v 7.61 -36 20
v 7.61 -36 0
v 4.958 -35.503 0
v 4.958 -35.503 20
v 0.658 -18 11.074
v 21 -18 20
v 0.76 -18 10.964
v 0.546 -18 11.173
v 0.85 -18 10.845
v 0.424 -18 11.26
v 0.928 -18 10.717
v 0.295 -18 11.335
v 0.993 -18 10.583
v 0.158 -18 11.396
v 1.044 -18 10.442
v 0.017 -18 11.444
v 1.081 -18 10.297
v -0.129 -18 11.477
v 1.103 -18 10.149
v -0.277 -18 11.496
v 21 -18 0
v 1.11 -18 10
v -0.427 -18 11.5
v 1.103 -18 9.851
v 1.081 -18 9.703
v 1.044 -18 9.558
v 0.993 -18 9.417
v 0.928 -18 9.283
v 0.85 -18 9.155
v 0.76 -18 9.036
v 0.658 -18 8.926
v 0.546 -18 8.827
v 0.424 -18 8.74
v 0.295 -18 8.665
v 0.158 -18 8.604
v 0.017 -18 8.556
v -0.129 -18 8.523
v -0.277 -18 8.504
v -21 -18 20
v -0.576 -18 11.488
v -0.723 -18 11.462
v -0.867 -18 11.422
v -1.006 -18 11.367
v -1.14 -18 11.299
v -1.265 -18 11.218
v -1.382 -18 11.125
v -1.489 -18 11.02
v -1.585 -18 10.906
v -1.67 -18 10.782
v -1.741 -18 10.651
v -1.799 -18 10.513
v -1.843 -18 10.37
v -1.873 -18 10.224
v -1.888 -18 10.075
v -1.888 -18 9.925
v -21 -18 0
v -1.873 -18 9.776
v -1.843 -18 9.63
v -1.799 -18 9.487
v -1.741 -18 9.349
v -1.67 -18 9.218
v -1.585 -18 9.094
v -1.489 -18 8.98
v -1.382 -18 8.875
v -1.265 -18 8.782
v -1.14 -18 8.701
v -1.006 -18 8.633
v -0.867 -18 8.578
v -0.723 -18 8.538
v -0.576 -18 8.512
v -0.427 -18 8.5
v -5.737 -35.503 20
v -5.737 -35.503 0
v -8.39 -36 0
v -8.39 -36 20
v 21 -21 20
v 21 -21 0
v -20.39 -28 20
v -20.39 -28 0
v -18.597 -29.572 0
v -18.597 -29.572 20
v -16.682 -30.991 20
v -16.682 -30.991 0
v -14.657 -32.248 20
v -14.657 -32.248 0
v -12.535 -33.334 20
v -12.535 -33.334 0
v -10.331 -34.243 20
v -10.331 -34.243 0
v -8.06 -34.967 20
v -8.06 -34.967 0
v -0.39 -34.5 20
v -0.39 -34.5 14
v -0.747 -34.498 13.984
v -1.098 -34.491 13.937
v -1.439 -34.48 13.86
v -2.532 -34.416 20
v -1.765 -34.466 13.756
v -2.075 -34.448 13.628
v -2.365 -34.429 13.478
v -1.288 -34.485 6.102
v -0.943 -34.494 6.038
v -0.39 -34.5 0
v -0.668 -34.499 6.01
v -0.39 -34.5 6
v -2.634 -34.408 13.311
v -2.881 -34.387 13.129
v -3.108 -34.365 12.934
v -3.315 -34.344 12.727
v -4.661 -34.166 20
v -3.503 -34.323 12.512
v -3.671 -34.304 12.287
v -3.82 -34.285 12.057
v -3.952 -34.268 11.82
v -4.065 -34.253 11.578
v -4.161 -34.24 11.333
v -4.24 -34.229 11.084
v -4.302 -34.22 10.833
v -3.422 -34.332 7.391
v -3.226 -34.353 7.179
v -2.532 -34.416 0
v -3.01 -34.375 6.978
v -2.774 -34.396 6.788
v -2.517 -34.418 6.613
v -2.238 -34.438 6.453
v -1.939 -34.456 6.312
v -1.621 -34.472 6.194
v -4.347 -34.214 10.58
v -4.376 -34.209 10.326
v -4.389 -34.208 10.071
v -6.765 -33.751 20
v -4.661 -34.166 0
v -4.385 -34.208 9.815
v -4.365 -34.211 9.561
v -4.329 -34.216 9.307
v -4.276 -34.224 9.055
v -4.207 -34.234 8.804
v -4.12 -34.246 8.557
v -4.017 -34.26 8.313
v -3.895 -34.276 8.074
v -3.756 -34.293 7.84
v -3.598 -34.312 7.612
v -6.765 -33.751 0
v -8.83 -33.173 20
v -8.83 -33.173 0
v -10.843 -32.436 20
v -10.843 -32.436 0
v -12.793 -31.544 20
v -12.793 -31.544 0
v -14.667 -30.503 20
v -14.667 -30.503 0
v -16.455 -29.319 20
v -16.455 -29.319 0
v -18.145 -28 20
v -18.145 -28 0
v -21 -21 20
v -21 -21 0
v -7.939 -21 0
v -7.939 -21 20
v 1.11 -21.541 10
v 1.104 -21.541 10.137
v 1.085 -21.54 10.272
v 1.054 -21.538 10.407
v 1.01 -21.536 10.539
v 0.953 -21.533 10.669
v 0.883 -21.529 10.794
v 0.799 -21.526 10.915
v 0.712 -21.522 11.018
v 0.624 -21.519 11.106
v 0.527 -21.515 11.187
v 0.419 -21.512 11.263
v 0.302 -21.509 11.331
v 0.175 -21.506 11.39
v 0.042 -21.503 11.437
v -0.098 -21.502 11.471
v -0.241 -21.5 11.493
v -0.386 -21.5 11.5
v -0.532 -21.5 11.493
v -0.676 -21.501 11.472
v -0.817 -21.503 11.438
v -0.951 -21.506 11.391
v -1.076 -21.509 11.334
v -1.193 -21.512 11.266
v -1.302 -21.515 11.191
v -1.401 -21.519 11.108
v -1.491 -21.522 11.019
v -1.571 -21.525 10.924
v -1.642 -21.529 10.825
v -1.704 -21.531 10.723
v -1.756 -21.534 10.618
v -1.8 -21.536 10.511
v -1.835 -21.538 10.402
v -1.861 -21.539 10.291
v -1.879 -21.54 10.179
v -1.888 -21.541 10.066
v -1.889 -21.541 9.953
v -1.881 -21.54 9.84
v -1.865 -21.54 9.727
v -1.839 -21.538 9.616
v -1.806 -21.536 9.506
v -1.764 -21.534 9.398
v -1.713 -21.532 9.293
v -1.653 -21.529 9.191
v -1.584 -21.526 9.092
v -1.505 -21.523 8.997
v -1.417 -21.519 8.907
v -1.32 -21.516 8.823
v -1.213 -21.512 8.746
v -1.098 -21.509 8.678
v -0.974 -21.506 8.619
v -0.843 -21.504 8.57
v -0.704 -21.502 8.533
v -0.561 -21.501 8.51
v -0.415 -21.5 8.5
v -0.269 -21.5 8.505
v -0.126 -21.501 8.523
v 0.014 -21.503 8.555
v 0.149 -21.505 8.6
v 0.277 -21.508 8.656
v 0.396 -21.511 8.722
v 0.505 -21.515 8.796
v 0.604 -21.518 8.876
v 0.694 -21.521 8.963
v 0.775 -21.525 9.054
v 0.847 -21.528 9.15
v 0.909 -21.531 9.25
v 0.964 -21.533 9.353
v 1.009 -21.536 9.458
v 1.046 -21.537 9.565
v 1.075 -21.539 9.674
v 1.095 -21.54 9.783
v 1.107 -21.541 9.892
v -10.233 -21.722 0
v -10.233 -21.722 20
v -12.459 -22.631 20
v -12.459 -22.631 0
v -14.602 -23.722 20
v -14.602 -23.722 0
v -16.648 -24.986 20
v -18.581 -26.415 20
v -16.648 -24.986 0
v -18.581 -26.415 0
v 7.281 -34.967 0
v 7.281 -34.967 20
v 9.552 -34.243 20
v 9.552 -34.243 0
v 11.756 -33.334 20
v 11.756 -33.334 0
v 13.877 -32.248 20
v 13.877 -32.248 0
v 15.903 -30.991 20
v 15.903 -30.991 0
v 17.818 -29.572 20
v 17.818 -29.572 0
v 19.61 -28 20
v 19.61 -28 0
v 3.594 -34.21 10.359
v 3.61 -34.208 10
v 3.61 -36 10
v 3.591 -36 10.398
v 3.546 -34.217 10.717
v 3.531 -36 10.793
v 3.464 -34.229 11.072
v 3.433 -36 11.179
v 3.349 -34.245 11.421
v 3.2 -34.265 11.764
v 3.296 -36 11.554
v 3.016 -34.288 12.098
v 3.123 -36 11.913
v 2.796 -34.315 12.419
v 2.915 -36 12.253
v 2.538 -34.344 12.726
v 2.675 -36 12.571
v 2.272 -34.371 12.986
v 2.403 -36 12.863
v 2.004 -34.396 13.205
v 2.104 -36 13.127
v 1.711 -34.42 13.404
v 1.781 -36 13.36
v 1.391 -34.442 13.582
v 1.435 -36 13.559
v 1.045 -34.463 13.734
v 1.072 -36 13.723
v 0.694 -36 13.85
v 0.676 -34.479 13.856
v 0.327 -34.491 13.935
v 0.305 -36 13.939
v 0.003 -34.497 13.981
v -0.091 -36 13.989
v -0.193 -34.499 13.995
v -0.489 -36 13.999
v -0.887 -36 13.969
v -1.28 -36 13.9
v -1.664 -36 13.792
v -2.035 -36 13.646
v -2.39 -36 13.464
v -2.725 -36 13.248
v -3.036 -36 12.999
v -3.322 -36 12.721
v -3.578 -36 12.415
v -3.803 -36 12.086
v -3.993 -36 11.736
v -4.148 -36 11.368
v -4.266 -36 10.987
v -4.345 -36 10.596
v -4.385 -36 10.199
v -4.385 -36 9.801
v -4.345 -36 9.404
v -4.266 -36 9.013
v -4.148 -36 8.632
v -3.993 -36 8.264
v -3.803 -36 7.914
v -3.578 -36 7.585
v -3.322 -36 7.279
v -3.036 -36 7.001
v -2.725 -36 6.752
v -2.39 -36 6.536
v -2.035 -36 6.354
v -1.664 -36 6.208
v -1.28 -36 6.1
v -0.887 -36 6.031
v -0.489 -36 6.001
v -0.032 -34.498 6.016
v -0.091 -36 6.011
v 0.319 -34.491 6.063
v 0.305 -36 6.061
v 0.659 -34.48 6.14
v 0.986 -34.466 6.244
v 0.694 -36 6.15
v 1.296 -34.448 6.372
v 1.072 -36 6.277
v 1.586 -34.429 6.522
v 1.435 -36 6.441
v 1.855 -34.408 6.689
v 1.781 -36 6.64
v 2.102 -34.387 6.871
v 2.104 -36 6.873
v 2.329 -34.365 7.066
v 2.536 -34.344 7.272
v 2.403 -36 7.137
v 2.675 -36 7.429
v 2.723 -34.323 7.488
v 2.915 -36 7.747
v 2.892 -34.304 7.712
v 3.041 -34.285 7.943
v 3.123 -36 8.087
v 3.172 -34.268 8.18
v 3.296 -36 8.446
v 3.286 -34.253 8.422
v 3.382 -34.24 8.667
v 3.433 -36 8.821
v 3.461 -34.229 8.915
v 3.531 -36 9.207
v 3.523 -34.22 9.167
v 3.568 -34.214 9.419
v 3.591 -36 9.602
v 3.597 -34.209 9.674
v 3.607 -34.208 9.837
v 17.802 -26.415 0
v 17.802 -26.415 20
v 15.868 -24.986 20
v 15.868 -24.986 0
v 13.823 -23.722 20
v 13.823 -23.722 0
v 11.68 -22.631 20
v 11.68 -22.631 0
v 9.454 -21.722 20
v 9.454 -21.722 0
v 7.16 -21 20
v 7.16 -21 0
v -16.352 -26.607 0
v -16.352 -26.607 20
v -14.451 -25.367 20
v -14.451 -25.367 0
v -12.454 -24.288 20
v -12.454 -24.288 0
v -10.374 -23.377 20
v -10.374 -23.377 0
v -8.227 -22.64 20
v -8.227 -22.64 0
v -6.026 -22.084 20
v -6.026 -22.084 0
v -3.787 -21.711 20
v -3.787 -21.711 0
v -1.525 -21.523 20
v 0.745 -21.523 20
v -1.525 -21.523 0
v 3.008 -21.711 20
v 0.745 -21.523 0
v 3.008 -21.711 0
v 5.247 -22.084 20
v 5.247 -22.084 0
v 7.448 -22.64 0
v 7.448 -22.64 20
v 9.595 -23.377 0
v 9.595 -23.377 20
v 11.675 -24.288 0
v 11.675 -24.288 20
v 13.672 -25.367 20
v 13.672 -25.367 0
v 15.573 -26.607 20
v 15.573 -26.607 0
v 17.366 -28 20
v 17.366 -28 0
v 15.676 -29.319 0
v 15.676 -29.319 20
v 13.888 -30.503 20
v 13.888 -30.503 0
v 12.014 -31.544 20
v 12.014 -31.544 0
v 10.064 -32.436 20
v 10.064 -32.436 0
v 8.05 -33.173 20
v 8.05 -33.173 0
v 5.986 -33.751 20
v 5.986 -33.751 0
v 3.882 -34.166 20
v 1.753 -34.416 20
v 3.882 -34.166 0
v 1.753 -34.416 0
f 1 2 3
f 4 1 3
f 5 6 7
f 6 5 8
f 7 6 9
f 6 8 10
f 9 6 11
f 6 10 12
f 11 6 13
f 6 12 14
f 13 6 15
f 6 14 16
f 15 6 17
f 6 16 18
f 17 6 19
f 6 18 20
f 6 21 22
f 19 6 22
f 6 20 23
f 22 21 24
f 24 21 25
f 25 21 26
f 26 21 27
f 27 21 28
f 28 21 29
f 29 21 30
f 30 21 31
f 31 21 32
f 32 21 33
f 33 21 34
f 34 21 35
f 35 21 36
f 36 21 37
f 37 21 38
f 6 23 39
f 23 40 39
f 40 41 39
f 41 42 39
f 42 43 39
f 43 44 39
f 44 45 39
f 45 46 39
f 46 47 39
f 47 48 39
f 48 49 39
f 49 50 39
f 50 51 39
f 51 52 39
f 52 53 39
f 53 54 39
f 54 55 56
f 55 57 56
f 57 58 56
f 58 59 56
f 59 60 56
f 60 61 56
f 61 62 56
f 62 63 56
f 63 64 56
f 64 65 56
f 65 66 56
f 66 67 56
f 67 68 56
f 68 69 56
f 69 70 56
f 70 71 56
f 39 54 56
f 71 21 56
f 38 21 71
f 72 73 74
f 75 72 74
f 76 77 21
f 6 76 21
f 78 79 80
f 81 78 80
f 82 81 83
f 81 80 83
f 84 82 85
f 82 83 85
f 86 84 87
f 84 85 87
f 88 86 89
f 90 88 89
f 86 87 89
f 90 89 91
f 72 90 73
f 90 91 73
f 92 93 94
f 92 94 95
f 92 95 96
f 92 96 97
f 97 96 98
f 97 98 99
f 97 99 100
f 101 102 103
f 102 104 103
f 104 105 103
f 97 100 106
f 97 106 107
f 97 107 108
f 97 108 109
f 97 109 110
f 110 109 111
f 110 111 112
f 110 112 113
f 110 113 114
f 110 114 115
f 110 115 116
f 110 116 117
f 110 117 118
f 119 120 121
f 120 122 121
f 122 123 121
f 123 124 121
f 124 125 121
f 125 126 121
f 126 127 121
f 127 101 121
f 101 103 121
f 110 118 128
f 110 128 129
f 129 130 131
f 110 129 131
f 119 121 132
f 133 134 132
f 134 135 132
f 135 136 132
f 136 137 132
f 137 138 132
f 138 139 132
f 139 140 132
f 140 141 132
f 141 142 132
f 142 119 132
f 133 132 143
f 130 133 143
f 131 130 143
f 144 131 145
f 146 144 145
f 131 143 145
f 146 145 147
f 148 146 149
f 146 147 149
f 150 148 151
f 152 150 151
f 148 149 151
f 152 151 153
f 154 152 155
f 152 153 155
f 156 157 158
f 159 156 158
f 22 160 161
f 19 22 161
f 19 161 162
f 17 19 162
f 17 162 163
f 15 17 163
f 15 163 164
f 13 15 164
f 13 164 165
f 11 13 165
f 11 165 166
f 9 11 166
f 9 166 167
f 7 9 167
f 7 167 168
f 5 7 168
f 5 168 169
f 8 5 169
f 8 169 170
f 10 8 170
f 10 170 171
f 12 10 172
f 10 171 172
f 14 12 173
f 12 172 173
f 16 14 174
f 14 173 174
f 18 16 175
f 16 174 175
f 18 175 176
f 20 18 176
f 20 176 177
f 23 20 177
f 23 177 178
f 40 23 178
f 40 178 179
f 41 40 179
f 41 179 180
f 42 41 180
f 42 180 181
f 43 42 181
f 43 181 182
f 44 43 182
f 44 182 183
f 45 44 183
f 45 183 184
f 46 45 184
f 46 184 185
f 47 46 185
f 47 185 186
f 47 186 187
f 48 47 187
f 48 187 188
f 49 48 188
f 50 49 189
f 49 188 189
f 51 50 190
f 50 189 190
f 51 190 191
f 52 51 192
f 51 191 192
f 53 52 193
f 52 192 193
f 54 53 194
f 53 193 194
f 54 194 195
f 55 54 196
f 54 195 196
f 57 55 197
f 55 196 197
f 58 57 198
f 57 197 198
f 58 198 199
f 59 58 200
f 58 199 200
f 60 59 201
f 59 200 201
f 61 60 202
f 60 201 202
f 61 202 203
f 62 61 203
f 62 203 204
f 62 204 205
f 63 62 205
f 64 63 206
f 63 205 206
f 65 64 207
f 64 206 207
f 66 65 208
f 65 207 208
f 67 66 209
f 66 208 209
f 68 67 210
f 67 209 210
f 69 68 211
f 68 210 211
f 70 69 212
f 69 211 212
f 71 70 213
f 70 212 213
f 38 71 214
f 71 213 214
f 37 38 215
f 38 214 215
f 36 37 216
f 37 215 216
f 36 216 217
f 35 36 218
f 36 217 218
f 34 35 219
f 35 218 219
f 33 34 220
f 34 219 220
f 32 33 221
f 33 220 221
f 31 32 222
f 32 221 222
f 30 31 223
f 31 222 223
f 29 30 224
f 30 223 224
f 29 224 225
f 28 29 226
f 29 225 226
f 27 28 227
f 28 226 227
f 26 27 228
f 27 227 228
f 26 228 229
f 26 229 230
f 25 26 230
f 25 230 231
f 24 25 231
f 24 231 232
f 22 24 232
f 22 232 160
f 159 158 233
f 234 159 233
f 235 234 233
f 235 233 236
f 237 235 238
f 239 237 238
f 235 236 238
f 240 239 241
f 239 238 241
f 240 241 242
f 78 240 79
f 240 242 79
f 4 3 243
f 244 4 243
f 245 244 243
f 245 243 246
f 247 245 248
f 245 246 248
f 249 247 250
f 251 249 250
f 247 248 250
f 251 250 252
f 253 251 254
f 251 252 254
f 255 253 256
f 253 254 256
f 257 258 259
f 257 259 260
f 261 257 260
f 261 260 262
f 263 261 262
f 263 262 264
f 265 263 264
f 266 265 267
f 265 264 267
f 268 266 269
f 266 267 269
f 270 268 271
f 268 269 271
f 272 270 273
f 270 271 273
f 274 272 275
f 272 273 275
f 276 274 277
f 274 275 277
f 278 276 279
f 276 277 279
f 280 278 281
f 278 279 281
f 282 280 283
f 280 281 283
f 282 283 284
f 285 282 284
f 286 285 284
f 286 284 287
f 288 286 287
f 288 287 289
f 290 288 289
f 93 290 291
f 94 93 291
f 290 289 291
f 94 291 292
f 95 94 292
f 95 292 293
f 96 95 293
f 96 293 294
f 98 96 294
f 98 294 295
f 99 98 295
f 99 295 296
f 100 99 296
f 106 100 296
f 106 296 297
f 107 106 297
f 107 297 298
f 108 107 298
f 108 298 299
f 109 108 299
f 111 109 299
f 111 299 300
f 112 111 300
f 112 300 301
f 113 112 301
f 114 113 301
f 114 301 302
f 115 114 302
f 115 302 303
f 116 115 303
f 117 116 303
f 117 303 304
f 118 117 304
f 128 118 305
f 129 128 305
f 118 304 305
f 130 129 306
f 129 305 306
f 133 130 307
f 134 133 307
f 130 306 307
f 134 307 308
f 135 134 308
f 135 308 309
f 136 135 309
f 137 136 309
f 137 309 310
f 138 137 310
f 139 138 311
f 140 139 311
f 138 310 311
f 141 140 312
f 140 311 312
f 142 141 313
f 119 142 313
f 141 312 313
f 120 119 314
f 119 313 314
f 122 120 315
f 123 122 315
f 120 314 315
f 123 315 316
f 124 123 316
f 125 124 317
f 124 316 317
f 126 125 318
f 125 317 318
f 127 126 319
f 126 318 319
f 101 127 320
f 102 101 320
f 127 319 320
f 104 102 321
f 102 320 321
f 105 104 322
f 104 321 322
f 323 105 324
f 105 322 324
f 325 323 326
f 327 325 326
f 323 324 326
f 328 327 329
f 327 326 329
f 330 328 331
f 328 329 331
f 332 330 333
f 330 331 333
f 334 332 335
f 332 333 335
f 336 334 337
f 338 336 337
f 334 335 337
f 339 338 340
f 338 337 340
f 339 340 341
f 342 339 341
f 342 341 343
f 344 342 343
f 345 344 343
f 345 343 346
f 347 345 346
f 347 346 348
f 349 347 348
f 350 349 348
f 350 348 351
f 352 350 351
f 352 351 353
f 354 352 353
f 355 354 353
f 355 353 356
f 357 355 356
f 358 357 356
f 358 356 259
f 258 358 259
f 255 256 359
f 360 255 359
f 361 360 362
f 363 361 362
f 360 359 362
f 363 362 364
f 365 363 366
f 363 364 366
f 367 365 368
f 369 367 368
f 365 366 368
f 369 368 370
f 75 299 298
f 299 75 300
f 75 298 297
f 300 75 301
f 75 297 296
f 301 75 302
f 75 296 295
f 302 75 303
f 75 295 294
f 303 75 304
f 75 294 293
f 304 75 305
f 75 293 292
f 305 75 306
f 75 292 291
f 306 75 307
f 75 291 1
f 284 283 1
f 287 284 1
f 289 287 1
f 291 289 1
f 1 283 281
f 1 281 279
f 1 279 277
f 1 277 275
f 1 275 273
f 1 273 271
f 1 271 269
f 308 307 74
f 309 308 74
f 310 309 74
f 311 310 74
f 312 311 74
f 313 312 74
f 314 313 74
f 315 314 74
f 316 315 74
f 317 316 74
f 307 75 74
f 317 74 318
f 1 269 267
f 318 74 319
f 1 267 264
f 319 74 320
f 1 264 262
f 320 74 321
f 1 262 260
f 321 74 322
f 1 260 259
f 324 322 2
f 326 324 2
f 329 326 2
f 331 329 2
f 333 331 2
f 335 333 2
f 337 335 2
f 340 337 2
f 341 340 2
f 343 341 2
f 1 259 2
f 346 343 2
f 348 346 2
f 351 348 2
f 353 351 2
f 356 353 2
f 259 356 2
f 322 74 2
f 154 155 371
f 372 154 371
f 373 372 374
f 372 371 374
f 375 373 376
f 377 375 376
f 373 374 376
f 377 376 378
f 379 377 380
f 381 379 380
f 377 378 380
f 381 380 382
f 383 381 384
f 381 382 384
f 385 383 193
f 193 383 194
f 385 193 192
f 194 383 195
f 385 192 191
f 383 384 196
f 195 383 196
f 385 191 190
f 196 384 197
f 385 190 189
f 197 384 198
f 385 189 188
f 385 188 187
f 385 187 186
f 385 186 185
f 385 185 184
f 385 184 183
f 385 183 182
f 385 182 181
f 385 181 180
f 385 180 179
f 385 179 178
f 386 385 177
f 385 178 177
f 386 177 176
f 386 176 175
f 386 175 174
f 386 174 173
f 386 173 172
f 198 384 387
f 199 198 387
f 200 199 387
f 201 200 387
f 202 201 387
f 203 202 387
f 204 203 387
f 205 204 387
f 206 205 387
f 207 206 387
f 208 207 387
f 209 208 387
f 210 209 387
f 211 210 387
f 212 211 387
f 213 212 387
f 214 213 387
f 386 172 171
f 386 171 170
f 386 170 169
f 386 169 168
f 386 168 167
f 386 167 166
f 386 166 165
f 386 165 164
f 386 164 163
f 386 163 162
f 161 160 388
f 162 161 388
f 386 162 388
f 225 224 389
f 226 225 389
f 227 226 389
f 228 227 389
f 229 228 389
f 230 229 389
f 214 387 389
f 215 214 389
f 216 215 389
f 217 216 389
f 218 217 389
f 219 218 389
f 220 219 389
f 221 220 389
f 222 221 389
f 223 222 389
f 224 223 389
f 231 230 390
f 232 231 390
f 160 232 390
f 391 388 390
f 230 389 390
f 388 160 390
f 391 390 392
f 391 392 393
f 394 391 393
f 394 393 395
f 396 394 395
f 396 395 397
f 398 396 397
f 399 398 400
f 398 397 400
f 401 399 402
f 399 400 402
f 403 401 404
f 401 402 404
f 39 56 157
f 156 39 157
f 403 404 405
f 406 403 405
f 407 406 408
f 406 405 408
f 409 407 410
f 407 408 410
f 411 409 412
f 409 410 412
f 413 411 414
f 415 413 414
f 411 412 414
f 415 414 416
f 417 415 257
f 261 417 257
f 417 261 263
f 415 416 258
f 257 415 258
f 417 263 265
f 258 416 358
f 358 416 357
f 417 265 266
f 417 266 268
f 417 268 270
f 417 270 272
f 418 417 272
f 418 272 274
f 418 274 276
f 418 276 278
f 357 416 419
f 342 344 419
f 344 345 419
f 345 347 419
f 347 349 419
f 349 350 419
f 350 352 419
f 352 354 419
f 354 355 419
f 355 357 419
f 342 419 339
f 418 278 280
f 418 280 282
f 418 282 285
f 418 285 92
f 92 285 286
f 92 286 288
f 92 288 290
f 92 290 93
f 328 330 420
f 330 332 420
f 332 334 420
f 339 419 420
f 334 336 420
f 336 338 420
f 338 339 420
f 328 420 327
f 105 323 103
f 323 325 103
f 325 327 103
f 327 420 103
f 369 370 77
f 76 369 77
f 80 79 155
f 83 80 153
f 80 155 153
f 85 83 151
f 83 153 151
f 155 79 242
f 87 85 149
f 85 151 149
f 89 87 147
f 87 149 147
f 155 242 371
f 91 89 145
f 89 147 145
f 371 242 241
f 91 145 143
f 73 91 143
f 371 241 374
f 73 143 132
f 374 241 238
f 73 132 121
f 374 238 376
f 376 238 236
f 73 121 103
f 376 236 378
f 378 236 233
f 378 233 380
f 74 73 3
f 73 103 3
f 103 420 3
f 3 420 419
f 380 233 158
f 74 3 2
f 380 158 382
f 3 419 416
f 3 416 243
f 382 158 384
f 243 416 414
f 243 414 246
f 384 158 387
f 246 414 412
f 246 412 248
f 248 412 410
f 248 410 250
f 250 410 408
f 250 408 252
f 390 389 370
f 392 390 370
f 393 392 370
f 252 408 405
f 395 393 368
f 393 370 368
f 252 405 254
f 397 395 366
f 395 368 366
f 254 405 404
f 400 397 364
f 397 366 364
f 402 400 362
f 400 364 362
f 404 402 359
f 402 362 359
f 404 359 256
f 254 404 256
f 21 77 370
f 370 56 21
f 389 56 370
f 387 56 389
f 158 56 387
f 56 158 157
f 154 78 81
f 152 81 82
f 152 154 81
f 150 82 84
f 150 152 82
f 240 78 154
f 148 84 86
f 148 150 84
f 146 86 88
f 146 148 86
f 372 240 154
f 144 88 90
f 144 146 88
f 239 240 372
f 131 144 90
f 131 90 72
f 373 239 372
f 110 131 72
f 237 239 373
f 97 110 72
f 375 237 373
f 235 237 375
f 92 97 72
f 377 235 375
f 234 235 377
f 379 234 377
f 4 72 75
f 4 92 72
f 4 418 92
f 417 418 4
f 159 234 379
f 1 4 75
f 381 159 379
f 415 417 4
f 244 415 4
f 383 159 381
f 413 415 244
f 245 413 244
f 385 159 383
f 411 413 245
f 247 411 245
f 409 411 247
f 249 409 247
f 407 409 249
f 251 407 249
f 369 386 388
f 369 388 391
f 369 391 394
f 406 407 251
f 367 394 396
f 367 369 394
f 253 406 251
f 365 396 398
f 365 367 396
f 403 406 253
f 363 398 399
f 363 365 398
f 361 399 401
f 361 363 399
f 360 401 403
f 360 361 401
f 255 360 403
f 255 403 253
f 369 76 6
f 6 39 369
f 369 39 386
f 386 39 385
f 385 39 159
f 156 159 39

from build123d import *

# Parameters (mm, degrees)
F1_DEPTH = 20
F2_R     = 4
F2_R_2   = 1.5
F3_DEPTH = 4
F4_DEPTH = 25


with BuildPart() as f1:
    # F0 (on Top) → F1 (new body)
    with BuildSketch(Plane.XY):
        with BuildLine():
            ThreePointArc((4.9580672995, -35.5026810684), (12.8277785568, -32.8128229291), (19.6104349345, -28))
            ThreePointArc((19.6104349345, -28), (13.8230470925, -23.7215179323), (7.1602693698, -21))
            Line((7.1602693698, -21), (-7.9393995008, -21))
            ThreePointArc((-7.9393995008, -21), (-14.6021772235, -23.7215179323), (-20.3895650655, -28))
            ThreePointArc((-20.3895650655, -28), (-13.6069086879, -32.8128229291), (-5.7371974305, -35.5026810684))
            Line((-5.7371974305, -35.5026810684), (-0.3895650655, -34.5))
            Line((-0.3895650655, -34.5), (4.9580672995, -35.5026810684))
        make_face()
        with BuildLine():
            ThreePointArc((17.3657158391, -28), (9.0642701351, -32.8239230172), (-0.3895650655, -34.5))
            ThreePointArc((-0.3895650655, -34.5), (-9.8434002661, -32.8239230172), (-18.1448459701, -28))
            ThreePointArc((-18.1448459701, -28), (-0.3895650655, -21.5), (17.3657158391, -28))
        make_face(mode=Mode.SUBTRACT)
        with BuildLine():
            Line((7.6104349345, -36), (4.9580672995, -35.5026810684))
            ThreePointArc((4.9580672995, -35.5026810684), (2.295788637, -35.8754026031), (-0.3895650655, -36))
            Line((-0.3895650655, -36), (7.6104349345, -36))
        make_face()
        with BuildLine():
            Line((-8.3895650655, -36), (-0.3895650655, -36))
            ThreePointArc((-0.3895650655, -36), (-3.074918768, -35.8754026031), (-5.7371974305, -35.5026810684))
            Line((-5.7371974305, -35.5026810684), (-8.3895650655, -36))
        make_face()
        with BuildLine():
            ThreePointArc((-0.3895650655, -36), (2.295788637, -35.8754026031), (4.9580672995, -35.5026810684))
            Line((4.9580672995, -35.5026810684), (-0.3895650655, -34.5))
            Line((-0.3895650655, -34.5), (-5.7371974305, -35.5026810684))
            ThreePointArc((-5.7371974305, -35.5026810684), (-3.074918768, -35.8754026031), (-0.3895650655, -36))
        make_face()
        with BuildLine():
            Line((-7.9393995008, -21), (7.1602693698, -21))
            ThreePointArc((7.1602693698, -21), (-0.3895650655, -20), (-7.9393995008, -21))
        make_face()
        with BuildLine():
            ThreePointArc((-7.9393995008, -21), (-0.3895650655, -20), (7.1602693698, -21))
            Line((7.1602693698, -21), (21, -21))
            Line((21, -21), (21, -18))
            Line((21, -18), (0, -18))
            Line((0, -18), (-21, -18))
            Line((-21, -18), (-21, -21))
            Line((-21, -21), (-7.9393995008, -21))
        make_face()
    extrude(amount=F1_DEPTH)

    # F2 (on face) → F3 (cut)
    with BuildSketch(Plane.XZ.offset(36)):
        with Locations((-0.3895650655, 10)):
            Circle(F2_R)
        with Locations((-0.3895650655, 10)):
            Circle(F2_R_2, mode=Mode.SUBTRACT)
    extrude(amount=-F3_DEPTH, mode=Mode.SUBTRACT)

    # F4 (cut): a face of the model
    f4_faces = [f1.faces().sort_by_distance(p)[0] for p in [
        (-0.3895650655, -36, 10),
    ]]
    extrude(f4_faces, amount=-F4_DEPTH, mode=Mode.SUBTRACT)


solid = f1.part
